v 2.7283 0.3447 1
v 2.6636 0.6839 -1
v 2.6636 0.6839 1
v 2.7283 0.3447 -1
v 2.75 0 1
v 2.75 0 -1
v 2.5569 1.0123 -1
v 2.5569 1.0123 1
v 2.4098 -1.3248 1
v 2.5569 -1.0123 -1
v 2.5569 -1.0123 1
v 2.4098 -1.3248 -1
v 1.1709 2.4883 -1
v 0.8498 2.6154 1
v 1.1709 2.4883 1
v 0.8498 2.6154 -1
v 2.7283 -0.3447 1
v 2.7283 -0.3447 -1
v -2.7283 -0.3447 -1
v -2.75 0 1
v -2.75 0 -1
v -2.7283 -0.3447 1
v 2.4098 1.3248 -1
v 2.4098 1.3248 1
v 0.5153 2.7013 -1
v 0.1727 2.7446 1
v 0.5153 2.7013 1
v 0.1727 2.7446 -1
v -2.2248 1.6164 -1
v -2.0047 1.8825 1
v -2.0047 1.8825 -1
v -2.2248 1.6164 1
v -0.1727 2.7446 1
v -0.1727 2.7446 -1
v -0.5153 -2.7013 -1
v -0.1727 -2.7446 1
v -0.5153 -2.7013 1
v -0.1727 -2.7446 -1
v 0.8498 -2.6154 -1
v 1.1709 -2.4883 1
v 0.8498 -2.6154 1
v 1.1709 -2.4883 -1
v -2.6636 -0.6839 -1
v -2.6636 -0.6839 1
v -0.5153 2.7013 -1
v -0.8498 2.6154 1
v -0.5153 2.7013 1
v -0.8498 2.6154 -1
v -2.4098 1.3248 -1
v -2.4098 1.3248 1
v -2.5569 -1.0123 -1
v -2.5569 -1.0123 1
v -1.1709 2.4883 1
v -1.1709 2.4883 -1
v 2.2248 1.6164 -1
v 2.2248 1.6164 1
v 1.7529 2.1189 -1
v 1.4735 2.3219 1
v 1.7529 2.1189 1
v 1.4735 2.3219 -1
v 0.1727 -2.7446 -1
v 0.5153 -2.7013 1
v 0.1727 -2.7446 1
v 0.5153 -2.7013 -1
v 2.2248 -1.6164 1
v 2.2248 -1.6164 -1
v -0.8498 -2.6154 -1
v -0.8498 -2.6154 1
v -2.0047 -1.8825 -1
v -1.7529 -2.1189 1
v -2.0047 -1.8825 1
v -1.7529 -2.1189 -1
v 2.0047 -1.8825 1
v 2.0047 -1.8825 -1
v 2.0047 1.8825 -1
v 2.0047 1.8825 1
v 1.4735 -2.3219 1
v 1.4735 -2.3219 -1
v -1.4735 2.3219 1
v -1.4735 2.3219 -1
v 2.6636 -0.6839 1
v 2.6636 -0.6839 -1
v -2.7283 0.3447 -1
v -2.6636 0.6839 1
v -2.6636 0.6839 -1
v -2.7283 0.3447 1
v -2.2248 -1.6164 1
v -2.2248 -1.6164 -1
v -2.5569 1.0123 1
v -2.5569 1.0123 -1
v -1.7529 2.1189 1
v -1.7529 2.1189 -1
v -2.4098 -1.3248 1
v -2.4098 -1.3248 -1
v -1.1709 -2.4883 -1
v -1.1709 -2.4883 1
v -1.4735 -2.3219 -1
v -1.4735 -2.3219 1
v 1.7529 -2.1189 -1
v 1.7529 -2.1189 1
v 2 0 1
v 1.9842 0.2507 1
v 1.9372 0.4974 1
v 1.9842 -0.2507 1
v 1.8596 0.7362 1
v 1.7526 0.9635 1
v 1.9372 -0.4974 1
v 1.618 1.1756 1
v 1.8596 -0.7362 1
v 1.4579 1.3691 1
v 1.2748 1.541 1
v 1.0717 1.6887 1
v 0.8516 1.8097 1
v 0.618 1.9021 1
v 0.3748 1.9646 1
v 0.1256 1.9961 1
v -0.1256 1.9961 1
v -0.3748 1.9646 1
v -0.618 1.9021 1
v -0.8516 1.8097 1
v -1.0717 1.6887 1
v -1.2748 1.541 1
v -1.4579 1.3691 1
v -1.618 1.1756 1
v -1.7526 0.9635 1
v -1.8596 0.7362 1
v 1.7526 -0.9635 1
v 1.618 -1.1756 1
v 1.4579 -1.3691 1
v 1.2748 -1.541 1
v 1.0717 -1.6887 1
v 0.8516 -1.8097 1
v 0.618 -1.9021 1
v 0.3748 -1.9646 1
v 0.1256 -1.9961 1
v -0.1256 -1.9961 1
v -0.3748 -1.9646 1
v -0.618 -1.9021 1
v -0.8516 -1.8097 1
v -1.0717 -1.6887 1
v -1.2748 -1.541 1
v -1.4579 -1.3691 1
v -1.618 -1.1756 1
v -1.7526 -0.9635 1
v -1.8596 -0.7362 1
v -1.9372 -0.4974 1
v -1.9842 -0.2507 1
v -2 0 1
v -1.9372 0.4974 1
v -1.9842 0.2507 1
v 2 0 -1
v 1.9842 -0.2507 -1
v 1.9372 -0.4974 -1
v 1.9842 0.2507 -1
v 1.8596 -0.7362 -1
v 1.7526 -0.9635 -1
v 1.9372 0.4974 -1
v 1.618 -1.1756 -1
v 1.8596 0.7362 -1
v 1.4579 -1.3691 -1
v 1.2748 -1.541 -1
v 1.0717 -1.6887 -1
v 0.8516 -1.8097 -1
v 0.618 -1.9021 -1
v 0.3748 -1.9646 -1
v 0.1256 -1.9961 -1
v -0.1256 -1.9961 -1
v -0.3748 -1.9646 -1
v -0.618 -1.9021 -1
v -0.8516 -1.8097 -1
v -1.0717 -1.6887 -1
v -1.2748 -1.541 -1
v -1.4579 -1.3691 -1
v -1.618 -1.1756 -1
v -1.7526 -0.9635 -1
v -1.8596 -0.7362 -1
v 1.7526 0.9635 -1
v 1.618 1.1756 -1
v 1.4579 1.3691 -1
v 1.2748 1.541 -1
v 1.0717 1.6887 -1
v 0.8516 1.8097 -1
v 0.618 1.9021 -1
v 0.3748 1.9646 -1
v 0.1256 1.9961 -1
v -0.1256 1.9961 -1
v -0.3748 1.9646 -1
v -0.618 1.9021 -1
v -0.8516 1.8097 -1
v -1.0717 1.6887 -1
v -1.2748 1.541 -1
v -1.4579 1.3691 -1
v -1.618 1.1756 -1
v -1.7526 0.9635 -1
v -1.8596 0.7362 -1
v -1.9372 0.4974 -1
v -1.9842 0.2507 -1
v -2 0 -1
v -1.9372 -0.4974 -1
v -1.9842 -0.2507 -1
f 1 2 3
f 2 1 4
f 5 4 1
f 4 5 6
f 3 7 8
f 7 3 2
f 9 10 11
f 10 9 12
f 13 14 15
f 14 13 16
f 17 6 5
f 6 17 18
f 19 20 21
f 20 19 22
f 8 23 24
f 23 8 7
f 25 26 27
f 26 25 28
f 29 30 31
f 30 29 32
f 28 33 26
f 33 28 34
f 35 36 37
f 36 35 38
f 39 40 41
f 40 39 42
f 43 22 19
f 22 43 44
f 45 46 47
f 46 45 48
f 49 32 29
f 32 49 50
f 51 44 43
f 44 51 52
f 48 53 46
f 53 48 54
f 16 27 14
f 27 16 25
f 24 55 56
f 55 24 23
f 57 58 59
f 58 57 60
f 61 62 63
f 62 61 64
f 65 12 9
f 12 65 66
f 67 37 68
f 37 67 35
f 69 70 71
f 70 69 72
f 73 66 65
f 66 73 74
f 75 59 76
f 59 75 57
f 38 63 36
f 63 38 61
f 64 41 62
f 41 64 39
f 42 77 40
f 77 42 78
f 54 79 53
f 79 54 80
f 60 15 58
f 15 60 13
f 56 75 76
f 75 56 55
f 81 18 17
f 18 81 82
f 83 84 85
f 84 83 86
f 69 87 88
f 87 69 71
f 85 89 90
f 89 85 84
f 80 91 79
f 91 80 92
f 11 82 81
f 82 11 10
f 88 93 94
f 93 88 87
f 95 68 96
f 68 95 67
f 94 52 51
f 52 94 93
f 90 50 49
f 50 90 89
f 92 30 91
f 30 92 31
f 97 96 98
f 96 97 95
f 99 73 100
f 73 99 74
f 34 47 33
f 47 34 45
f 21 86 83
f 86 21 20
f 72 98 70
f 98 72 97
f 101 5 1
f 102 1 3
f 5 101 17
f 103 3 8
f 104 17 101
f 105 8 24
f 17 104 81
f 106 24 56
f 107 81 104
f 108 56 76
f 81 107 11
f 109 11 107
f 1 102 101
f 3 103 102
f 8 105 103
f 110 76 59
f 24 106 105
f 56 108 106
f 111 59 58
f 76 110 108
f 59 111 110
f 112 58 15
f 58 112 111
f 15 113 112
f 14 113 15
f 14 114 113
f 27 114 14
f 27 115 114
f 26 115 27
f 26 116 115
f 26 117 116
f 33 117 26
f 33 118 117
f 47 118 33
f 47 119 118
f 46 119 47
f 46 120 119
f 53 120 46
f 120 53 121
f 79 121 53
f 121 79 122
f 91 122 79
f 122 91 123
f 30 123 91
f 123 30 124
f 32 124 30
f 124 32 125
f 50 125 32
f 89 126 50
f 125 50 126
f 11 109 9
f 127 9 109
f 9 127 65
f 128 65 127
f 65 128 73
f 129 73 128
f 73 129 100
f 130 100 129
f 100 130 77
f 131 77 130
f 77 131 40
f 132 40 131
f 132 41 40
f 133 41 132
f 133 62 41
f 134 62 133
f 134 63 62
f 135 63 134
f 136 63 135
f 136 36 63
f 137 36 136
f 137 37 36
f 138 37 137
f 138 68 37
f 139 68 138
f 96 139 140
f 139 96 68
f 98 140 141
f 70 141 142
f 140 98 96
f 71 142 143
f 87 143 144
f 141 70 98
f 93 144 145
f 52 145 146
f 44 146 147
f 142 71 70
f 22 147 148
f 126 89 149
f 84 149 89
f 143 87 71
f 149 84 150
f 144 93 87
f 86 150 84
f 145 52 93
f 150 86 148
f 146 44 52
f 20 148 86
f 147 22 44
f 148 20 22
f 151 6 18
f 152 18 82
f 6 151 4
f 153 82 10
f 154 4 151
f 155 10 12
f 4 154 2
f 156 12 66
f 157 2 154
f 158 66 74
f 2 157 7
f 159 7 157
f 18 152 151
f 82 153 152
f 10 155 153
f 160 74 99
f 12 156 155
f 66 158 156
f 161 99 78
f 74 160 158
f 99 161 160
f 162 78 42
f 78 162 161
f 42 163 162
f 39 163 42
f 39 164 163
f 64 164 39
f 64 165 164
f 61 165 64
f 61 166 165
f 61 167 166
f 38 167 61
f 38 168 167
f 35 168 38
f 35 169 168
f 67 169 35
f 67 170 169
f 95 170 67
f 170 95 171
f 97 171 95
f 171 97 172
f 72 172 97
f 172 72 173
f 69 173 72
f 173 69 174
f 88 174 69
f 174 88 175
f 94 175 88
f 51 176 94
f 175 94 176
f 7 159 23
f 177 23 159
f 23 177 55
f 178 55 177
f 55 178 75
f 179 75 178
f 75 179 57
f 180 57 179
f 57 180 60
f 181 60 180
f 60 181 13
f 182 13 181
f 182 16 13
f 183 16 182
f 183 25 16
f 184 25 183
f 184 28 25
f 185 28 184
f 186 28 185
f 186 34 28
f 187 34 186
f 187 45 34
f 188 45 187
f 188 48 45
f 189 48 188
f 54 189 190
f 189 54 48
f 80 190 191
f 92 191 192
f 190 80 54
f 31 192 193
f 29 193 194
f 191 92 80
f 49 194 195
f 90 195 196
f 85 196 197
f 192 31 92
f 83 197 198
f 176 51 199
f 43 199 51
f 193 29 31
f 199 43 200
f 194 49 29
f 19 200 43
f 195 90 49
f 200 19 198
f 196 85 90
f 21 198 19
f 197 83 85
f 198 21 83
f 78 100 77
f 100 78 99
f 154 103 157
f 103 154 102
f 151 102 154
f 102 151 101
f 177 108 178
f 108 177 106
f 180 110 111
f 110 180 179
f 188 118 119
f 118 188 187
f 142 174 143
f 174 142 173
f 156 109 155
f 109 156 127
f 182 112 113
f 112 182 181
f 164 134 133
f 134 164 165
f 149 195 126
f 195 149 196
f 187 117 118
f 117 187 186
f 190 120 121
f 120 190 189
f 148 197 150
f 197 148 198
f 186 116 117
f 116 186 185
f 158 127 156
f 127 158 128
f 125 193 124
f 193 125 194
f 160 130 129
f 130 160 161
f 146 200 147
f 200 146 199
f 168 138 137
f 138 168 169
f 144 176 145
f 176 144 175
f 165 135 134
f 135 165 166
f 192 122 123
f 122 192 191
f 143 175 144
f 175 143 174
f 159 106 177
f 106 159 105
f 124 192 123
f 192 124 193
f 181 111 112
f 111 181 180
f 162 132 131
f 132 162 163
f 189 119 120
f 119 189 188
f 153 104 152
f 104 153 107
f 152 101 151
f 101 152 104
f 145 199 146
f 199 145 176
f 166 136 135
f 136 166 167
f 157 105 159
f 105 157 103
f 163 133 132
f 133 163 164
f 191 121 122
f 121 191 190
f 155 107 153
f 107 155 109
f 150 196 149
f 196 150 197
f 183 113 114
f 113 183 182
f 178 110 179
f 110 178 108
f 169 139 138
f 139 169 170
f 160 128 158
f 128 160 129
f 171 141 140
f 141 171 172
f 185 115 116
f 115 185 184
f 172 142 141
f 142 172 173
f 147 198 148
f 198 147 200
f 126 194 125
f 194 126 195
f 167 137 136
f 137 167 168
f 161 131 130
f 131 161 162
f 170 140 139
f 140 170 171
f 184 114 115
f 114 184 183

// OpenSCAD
$fn = 50;


difference() {
	union() {
		translate(v = [0, 0, -1.0000000000]) {
			cylinder(h = 2, r = 2.7500000000);
		}
	}
	union() {
		translate(v = [0, 0, -100.0000000000]) {
			cylinder(h = 200, r = 2.0000000000);
		}
	}
}
